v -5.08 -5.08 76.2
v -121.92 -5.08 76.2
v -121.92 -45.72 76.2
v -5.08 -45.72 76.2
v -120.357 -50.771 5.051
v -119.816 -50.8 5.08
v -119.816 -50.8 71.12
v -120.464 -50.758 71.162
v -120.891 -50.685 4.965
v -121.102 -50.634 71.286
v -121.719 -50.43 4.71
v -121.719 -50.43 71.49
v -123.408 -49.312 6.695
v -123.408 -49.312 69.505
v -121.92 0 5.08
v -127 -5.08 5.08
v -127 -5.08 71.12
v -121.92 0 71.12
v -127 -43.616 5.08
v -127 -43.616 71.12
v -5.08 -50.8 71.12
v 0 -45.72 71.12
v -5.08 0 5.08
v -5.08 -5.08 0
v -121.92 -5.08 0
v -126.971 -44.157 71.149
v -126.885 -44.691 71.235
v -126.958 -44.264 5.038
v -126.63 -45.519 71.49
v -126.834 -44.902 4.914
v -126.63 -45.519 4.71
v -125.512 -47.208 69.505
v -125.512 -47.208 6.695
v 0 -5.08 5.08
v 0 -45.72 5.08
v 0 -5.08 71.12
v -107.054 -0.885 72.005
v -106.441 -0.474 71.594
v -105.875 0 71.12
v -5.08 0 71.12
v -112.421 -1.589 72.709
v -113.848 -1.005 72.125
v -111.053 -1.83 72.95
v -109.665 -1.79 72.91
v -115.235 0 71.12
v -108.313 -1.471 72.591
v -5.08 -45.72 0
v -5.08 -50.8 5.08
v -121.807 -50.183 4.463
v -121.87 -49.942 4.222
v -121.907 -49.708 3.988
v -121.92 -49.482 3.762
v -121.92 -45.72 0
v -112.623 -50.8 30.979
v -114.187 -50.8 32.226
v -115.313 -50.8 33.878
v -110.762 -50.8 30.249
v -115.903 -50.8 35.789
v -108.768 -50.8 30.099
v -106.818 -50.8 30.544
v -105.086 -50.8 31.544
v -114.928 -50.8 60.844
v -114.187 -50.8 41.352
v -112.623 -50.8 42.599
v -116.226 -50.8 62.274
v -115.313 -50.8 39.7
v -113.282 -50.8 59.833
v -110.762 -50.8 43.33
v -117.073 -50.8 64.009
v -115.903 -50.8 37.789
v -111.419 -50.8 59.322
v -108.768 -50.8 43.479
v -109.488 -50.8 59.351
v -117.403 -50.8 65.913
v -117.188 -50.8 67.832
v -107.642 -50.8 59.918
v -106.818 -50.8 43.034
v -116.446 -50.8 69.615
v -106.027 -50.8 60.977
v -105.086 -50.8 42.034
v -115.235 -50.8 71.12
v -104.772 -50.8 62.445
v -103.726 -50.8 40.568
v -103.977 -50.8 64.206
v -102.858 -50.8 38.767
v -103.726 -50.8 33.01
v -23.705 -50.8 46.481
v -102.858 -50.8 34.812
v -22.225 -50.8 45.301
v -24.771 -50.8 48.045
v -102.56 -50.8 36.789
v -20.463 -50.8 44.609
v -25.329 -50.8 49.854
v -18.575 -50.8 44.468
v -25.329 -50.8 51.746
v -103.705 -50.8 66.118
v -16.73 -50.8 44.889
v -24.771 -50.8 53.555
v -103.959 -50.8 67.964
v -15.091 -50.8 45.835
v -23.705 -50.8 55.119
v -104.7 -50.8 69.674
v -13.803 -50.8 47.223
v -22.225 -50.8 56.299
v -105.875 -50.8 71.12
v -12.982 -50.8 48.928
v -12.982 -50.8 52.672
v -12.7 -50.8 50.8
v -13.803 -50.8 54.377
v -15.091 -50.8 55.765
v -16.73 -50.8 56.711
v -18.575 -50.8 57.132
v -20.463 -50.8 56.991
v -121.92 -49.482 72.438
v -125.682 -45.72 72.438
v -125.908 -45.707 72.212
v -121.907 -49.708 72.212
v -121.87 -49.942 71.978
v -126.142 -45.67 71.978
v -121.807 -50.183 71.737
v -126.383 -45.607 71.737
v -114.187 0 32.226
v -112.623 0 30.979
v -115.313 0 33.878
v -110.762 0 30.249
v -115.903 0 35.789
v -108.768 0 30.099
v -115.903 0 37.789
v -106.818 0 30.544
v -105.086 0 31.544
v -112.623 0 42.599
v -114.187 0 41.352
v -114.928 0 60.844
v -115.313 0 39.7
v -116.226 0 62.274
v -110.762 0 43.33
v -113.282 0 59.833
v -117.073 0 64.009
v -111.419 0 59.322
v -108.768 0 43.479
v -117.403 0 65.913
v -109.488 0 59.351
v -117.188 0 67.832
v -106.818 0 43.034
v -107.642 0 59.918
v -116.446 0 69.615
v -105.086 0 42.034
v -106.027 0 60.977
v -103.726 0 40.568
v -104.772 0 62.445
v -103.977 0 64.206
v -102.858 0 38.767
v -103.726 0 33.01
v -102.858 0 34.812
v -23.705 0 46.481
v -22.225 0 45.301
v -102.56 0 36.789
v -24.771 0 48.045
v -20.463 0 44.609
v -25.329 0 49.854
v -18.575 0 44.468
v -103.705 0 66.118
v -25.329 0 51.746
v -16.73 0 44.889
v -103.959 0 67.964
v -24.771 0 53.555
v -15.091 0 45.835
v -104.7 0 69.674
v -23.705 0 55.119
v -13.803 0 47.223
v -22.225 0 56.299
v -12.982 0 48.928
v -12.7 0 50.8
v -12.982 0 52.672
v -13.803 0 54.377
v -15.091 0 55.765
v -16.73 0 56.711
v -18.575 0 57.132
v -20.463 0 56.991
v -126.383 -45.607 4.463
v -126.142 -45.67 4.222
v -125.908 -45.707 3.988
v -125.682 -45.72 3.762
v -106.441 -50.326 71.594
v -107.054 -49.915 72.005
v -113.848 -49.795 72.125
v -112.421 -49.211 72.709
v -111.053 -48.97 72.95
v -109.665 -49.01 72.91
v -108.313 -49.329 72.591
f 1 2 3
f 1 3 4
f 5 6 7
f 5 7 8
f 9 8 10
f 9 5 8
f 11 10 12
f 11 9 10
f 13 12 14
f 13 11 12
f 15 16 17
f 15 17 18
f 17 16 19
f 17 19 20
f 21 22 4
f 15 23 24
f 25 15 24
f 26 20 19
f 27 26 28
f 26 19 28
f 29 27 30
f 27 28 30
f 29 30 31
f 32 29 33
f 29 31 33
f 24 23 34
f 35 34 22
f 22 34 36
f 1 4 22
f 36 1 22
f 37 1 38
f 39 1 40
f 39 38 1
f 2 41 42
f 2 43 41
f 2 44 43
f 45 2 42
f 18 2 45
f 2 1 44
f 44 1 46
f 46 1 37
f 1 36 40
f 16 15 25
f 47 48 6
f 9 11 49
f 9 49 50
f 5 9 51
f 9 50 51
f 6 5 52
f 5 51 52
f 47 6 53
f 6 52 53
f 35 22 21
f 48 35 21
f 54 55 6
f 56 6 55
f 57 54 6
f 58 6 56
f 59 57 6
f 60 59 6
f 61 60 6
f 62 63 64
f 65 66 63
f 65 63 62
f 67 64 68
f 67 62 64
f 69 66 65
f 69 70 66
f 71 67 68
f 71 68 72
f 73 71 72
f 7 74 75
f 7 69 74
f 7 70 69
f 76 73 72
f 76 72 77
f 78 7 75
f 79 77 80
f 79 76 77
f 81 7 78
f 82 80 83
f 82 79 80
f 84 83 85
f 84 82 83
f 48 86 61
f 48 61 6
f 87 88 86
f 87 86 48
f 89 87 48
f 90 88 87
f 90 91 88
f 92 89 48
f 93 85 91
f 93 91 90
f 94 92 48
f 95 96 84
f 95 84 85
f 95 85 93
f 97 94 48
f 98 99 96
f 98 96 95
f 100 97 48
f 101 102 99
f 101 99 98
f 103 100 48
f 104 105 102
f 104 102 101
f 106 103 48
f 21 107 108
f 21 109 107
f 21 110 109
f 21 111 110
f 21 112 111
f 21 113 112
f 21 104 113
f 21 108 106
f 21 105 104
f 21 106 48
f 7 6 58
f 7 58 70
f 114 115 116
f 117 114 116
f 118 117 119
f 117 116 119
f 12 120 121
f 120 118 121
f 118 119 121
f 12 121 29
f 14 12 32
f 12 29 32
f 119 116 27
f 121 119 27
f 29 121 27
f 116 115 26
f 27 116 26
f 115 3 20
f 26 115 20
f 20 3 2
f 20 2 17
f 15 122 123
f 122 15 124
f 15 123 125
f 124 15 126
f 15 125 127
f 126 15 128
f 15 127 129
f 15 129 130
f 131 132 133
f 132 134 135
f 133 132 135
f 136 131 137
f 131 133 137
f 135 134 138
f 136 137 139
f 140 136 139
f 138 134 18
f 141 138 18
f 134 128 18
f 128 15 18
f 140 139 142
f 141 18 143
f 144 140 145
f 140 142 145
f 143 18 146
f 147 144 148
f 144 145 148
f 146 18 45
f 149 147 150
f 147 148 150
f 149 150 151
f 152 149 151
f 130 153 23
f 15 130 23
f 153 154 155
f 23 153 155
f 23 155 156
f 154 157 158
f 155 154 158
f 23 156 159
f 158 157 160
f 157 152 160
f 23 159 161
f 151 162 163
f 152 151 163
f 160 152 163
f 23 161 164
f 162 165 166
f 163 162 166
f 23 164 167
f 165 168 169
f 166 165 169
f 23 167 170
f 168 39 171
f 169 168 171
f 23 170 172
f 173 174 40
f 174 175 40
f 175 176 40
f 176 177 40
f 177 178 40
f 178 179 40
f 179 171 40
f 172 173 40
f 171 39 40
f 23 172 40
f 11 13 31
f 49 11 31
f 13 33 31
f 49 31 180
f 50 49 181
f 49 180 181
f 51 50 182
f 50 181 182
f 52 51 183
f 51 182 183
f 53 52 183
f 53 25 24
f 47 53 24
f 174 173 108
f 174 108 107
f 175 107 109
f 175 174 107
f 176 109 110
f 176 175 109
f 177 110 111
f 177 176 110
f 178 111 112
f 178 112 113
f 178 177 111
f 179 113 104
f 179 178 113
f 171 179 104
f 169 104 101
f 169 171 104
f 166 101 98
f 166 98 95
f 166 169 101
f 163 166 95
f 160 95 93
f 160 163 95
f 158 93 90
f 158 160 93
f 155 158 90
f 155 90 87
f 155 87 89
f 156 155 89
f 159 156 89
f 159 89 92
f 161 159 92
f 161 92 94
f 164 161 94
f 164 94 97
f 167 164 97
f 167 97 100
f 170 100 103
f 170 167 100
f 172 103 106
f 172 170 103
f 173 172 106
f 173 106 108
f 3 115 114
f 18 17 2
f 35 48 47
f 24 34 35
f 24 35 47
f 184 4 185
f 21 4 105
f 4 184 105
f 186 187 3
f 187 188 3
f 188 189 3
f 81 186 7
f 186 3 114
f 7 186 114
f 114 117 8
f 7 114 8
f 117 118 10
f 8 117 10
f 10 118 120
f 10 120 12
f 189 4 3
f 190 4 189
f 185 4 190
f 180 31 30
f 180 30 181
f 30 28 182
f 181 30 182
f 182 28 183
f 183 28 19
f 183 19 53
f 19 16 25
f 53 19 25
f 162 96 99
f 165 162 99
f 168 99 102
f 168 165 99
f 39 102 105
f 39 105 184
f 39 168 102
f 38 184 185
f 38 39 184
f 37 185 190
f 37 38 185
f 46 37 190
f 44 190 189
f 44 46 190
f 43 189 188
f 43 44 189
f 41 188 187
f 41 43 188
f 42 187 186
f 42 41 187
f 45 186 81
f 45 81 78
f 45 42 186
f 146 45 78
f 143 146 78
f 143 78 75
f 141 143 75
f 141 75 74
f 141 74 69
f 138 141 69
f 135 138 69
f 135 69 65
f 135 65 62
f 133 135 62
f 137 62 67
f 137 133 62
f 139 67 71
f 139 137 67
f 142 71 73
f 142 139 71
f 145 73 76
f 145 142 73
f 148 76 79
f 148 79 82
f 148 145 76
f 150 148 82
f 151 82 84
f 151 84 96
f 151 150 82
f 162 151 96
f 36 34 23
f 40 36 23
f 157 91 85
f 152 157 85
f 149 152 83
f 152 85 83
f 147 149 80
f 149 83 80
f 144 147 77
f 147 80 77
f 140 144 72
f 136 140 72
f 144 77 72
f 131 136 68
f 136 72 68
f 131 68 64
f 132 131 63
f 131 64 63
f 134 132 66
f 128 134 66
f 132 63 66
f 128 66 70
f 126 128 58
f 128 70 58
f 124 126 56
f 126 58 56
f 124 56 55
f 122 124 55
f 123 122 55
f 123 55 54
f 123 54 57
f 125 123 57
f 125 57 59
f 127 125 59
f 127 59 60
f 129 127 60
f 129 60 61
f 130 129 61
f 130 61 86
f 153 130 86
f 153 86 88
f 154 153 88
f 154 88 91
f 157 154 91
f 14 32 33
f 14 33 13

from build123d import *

# Parameters (mm, degrees)
F0_W         = 127
F0_H         = 76.2
F0_R         = 6.8502620854
F0_R_2       = 6.35
F1_DEPTH     = 50.8
F2_R         = 6.7087058048
F3_DEPTH     = 127
F4_T1_DEPTH  = 6.4524666085
F4_T3_DEPTH  = 6.4524666085
F4_T5_DEPTH  = 6.4524666085
F4_T7_DEPTH  = 6.4524666085
F4_T9_DEPTH  = 6.4524666085
F4_T11_DEPTH = 6.4524666085
F4_T13_DEPTH = 6.4524666085
F4_T15_DEPTH = 6.4524666085
F4_T17_DEPTH = 102.3282991577
F4_T19_DEPTH = 153.1282991577
F4_T21_DEPTH = 76.9282991577
F5_T1_DEPTH  = 15.2572709249
F5_T3_DEPTH  = 76.5610244843


# Not quite as in the source:
# - a fillet or chamfer that OpenCascade refuses, or shapes differently, is made with other operations: its cross-section is extruded or revolved along the edge and cut away or added


with BuildPart() as f1:
    # F0 (on Front) → F1 (new body)
    with BuildSketch(Plane.XZ):
        with Locations((-63.5, 38.1)):
            Rectangle(F0_W, F0_H)
        with Locations((-110.5553433299, 66.1175847054)):
            Circle(F0_R, mode=Mode.SUBTRACT)
        with Locations((-19.05, 50.8)):
            Circle(F0_R_2, mode=Mode.SUBTRACT)
    extrude(amount=F1_DEPTH)

    # F2 (on face) → F3 (cut)
    with BuildSketch(Plane.XZ.offset(50.8)):
        with Locations((-109.2690080404, 36.7891639471)):
            Circle(F2_R)
    extrude(amount=-F3_DEPTH, mode=Mode.SUBTRACT)

    # F4: chamfer of 5.08 on 12 edges, made by hand

    # F4_s2 → F4_t1 (cut)
    with BuildSketch(Plane(origin=(-81.28, -81.28, 81.28), x_dir=(0.7071067812, -0.7071067812, 0), z_dir=(-0.5773502692, -0.5773502692, 0.5773502692))):
        Polygon((-53.8815367264, -6.2217039467), (-57.4736391748, -12.4434078933), (-50.289434278, -12.4434078933), align=None)
    extrude(amount=F4_T1_DEPTH, mode=Mode.SUBTRACT)

    # F4_s4 → F4_t3 (cut)
    with BuildSketch(Plane(origin=(-55.88, -55.88, -55.88), x_dir=(0.7071067812, -0.7071067812, 0), z_dir=(-0.5773502692, -0.5773502692, -0.5773502692))):
        Polygon((-57.4736391748, 74.66044736), (-50.289434278, 74.66044736), (-53.8815367264, 68.4387434134), align=None)
    extrude(amount=F4_T3_DEPTH, mode=Mode.SUBTRACT)

    # F4_s6 → F4_t5 (cut)
    with BuildSketch(Plane(origin=(38.9466666667, -38.9466666667, 38.9466666667), x_dir=(0.7071067812, 0.7071067812, 0), z_dir=(0.5773502692, -0.5773502692, 0.5773502692))):
        Polygon((-35.9210244843, 45.6258289422), (-32.3289220358, 39.4041249956), (-39.5131269327, 39.4041249956), align=None)
    extrude(amount=F4_T5_DEPTH, mode=Mode.SUBTRACT)

    # F4_s8 → F4_t7 (cut)
    with BuildSketch(Plane(origin=(-64.3466666667, 64.3466666667, 64.3466666667), x_dir=(-0.7071067812, -0.7071067812, 0), z_dir=(-0.5773502692, 0.5773502692, 0.5773502692))):
        Polygon((89.8025612107, 14.5173092089), (93.3946636591, 8.2956052622), (86.2104587623, 8.2956052622), align=None)
    extrude(amount=F4_T7_DEPTH, mode=Mode.SUBTRACT)

    # F4_s10 → F4_t9 (cut)
    with BuildSketch(Plane(origin=(-38.9466666667, 38.9466666667, -38.9466666667), x_dir=(-0.7071067812, -0.7071067812, 0), z_dir=(-0.5773502692, 0.5773502692, -0.5773502692))):
        Polygon((93.3946636591, 53.9214342045), (86.2104587623, 53.9214342045), (89.8025612107, 47.6997302578), align=None)
    extrude(amount=F4_T9_DEPTH, mode=Mode.SUBTRACT)

    # F4_s12 → F4_t11 (cut)
    with BuildSketch(Plane(origin=(22.0133333333, 22.0133333333, 22.0133333333), x_dir=(-0.7071067812, 0.7071067812, 0), z_dir=(0.5773502692, 0.5773502692, 0.5773502692))):
        Polygon((0, 66.3648420978), (-3.5921024484, 60.1431381511), (3.5921024484, 60.1431381511), align=None)
    extrude(amount=F4_T11_DEPTH, mode=Mode.SUBTRACT)

    # F4_s14 → F4_t13 (cut)
    with BuildSketch(Plane(origin=(-3.3866666667, -3.3866666667, 3.3866666667), x_dir=(-0.7071067812, 0.7071067812, 0), z_dir=(0.5773502692, 0.5773502692, -0.5773502692))):
        Polygon((-3.5921024484, 2.0739013156), (3.5921024484, 2.0739013156), (0, -4.1478026311), align=None)
    extrude(amount=F4_T13_DEPTH, mode=Mode.SUBTRACT)

    # F4_s16 → F4_t15 (cut)
    with BuildSketch(Plane(origin=(13.5466666667, -13.5466666667, -13.5466666667), x_dir=(0.7071067812, 0.7071067812, 0), z_dir=(0.5773502692, -0.5773502692, -0.5773502692))):
        Polygon((-32.3289220358, 22.8129144711), (-39.5131269327, 22.8129144711), (-35.9210244843, 16.5912105245), align=None)
    extrude(amount=F4_T15_DEPTH, mode=Mode.SUBTRACT)

    # F4_s18 → F4_t17 (cut)
    with BuildSketch(Plane.XY.offset(-13.0641495789)):
        Polygon((-127, -45.72), (-121.92, -50.8), (-127, -50.8), align=None)
        Polygon((-127, -5.08), (-121.92, 0), (-127, 0), align=None)
        Polygon((0, -45.72), (-5.08, -50.8), (0, -50.8), align=None)
        Polygon((0, -5.08), (-5.08, 0), (0, 0), align=None)
    extrude(amount=F4_T17_DEPTH, mode=Mode.SUBTRACT)

    # F4_s20 → F4_t19 (cut)
    with BuildSketch(Plane.YZ.offset(-140.0641495789)):
        Polygon((-45.72, 76.2), (-50.8, 71.12), (-50.8, 76.2), align=None)
        Polygon((-5.08, 76.2), (0, 71.12), (0, 76.2), align=None)
        Polygon((0, 5.08), (-5.08, 0), (0, 0), align=None)
        Polygon((-50.8, 5.08), (-45.72, 0), (-50.8, 0), align=None)
    extrude(amount=F4_T19_DEPTH, mode=Mode.SUBTRACT)

    # F4_s22 → F4_t21 (cut)
    with BuildSketch(Plane.XZ.offset(-13.0641495789)):
        Polygon((-127, 5.08), (-121.92, 0), (-127, 0), align=None)
        Polygon((-121.92, 76.2), (-127, 71.12), (-127, 76.2), align=None)
        Polygon((0, 5.08), (-5.08, 0), (0, 0), align=None)
        Polygon((-5.08, 76.2), (0, 71.12), (0, 76.2), align=None)
    extrude(amount=F4_T21_DEPTH, mode=Mode.SUBTRACT)

    # F5: fillet of radius 5.08 on 4 edges, made by hand

    # F5_s2 → F5_t1 (cut)
    with BuildSketch(Plane(origin=(-43.4942598667, 43.4942598667, 0), x_dir=(0, 0, 1), z_dir=(0.7071067812, -0.7071067812, 0))):
        with BuildLine():
            ThreePointArc((6.6946132056, 122.1314832465), (5.1558535372, 121.892827965), (3.7616738381, 121.1992858777))
            Line((3.7616738381, 121.1992858777), (5.08, 122.1314832465))
            Line((5.08, 122.1314832465), (6.6946132056, 122.1314832465))
        make_face()
        with BuildLine():
            ThreePointArc((72.4383261619, 121.1992858777), (71.0441464628, 121.892827965), (69.5053867944, 122.1314832465))
            Line((69.5053867944, 122.1314832465), (71.12, 122.1314832465))
            Line((71.12, 122.1314832465), (72.4383261619, 121.1992858777))
        make_face()
    extrude(amount=F5_T1_DEPTH, mode=Mode.SUBTRACT)

    # F5_s4 → F5_t3 (cut)
    with BuildSketch(Plane.XY.offset(-0.1805122422)):
        with BuildLine():
            ThreePointArc((-119.8157951031, -50.8), (-121.7598269396, -50.4133080252), (-123.4078975516, -49.3121024484))
            Line((-123.4078975516, -49.3121024484), (-121.92, -50.8))
            Line((-121.92, -50.8), (-119.8157951031, -50.8))
        make_face()
        with BuildLine():
            ThreePointArc((-127, -43.6157951031), (-126.6133080252, -45.5598269396), (-125.5121024484, -47.2078975516))
            Line((-125.5121024484, -47.2078975516), (-127, -45.72))
            Line((-127, -45.72), (-127, -43.6157951031))
        make_face()
    extrude(amount=F5_T3_DEPTH, mode=Mode.SUBTRACT)


solid = f1.part
